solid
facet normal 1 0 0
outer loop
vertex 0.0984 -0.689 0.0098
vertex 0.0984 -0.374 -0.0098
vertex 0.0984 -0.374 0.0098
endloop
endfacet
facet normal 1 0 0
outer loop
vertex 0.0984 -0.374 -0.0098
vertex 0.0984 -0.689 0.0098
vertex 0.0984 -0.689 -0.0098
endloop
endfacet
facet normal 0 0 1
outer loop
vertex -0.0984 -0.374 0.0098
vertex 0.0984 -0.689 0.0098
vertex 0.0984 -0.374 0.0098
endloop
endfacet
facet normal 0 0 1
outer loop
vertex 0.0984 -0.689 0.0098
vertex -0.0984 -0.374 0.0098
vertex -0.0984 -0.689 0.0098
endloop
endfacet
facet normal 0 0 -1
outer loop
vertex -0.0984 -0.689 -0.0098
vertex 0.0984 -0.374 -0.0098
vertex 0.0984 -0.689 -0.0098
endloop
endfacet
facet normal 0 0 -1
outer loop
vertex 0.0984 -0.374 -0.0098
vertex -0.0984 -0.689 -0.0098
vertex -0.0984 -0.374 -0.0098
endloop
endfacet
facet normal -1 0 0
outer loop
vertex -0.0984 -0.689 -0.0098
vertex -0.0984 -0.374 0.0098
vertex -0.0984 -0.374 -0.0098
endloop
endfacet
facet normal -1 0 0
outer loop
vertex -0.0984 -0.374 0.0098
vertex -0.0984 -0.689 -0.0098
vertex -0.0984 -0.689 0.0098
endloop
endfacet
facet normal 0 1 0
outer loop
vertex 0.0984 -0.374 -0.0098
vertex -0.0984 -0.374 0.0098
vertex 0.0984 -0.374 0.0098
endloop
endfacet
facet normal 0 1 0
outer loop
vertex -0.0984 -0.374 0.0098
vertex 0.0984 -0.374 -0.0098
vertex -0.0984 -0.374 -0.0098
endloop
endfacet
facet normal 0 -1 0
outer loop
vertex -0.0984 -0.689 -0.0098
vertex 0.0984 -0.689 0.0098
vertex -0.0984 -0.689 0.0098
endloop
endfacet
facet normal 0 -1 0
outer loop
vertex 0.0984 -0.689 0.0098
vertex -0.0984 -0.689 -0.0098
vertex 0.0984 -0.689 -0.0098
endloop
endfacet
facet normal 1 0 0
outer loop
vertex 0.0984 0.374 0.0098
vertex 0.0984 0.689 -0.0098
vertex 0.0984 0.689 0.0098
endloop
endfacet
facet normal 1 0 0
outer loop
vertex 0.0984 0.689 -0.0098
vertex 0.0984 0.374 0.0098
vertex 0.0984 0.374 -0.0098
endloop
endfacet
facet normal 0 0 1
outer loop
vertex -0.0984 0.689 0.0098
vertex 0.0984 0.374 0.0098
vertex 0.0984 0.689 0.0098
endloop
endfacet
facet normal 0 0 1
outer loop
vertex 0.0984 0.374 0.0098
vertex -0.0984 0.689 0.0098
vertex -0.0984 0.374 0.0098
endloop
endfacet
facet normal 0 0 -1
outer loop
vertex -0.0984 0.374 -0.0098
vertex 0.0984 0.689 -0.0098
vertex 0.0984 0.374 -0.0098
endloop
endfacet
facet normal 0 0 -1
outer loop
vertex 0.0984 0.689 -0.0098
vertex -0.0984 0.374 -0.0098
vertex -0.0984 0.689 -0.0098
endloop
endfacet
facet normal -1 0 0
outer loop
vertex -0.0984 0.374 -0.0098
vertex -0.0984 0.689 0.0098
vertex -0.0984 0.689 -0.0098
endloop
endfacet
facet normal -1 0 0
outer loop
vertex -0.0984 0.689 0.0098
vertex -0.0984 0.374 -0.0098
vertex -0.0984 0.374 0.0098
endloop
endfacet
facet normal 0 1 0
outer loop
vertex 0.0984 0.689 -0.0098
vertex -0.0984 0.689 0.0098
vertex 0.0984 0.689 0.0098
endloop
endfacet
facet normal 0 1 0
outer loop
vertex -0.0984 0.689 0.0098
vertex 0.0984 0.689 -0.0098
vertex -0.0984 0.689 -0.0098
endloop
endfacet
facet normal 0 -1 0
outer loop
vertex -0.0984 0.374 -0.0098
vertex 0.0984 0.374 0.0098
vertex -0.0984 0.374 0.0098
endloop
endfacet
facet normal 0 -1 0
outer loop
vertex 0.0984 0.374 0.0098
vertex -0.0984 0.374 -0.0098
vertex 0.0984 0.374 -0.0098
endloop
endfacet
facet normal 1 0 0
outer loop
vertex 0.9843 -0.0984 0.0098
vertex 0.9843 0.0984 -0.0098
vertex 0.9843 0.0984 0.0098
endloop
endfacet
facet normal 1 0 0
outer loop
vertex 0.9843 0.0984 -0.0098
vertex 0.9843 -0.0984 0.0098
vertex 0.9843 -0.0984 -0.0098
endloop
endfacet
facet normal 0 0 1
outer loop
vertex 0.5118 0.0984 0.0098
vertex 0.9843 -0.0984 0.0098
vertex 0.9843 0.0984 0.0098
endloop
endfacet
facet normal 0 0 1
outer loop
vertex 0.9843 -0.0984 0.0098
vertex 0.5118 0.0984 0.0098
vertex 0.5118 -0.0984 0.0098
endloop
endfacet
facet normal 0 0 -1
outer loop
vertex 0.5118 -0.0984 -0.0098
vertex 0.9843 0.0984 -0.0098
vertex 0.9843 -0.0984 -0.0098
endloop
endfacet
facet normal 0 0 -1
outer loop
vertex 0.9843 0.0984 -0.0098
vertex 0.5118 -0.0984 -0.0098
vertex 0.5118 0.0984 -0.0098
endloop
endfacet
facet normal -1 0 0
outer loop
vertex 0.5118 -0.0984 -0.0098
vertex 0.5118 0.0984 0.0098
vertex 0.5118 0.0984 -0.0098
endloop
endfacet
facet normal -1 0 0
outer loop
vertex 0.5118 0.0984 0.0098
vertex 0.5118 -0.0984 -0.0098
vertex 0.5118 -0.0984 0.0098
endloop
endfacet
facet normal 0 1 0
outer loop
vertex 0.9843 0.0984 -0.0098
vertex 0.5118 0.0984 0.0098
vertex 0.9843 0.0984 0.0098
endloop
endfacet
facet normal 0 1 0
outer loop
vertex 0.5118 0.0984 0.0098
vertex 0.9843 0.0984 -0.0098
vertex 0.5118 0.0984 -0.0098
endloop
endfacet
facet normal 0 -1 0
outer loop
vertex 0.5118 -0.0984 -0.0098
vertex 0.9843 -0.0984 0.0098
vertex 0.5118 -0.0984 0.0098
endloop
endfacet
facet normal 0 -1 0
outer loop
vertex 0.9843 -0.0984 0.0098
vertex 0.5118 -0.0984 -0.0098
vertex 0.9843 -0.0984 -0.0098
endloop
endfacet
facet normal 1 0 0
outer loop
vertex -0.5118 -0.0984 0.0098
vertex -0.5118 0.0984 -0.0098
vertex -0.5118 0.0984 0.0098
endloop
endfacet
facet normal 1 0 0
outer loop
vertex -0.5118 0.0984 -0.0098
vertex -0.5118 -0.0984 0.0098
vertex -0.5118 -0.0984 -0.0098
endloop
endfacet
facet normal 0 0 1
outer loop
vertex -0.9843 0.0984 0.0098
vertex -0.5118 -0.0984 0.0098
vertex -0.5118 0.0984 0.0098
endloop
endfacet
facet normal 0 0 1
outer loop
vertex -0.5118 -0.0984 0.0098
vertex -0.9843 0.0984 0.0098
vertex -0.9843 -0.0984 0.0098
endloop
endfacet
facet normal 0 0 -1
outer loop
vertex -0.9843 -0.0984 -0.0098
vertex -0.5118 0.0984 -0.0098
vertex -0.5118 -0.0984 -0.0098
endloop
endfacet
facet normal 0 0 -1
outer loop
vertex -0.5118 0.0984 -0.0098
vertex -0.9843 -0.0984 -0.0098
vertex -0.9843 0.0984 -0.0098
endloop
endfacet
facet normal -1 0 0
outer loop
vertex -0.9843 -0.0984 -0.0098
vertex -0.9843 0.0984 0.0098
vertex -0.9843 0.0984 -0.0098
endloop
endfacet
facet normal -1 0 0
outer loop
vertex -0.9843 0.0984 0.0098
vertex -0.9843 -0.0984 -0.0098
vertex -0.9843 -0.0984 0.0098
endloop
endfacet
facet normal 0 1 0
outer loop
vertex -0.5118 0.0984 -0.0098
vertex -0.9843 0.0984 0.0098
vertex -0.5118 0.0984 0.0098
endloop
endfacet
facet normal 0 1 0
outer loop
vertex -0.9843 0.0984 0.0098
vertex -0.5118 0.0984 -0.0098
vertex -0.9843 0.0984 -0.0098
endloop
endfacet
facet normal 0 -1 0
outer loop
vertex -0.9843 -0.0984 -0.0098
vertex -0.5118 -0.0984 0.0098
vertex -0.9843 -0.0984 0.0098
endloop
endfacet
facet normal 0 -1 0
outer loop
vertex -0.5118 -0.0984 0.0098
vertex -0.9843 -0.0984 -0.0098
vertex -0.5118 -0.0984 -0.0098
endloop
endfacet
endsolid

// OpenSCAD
// file: defines.scad
L = 5;  // Длина
W = 3.5;  // Ширина
H = 1.4;  // Высота

Hf = 0.05;

scale = 1/2.54;
// main file
include <defines.scad>

scale(scale)
  translate([0,0,0])
  union() {
    translate([0,-1.35, 0]) cube([0.5, 0.8, Hf], center = true);
    translate([0, 1.35, 0]) cube([0.5, 0.8, Hf], center = true);

    translate([ 1.9, 0, 0]) cube([1.2, 0.5, Hf], center = true);
    translate([-1.9, 0, 0]) cube([1.2, 0.5, Hf], center = true);

  }
